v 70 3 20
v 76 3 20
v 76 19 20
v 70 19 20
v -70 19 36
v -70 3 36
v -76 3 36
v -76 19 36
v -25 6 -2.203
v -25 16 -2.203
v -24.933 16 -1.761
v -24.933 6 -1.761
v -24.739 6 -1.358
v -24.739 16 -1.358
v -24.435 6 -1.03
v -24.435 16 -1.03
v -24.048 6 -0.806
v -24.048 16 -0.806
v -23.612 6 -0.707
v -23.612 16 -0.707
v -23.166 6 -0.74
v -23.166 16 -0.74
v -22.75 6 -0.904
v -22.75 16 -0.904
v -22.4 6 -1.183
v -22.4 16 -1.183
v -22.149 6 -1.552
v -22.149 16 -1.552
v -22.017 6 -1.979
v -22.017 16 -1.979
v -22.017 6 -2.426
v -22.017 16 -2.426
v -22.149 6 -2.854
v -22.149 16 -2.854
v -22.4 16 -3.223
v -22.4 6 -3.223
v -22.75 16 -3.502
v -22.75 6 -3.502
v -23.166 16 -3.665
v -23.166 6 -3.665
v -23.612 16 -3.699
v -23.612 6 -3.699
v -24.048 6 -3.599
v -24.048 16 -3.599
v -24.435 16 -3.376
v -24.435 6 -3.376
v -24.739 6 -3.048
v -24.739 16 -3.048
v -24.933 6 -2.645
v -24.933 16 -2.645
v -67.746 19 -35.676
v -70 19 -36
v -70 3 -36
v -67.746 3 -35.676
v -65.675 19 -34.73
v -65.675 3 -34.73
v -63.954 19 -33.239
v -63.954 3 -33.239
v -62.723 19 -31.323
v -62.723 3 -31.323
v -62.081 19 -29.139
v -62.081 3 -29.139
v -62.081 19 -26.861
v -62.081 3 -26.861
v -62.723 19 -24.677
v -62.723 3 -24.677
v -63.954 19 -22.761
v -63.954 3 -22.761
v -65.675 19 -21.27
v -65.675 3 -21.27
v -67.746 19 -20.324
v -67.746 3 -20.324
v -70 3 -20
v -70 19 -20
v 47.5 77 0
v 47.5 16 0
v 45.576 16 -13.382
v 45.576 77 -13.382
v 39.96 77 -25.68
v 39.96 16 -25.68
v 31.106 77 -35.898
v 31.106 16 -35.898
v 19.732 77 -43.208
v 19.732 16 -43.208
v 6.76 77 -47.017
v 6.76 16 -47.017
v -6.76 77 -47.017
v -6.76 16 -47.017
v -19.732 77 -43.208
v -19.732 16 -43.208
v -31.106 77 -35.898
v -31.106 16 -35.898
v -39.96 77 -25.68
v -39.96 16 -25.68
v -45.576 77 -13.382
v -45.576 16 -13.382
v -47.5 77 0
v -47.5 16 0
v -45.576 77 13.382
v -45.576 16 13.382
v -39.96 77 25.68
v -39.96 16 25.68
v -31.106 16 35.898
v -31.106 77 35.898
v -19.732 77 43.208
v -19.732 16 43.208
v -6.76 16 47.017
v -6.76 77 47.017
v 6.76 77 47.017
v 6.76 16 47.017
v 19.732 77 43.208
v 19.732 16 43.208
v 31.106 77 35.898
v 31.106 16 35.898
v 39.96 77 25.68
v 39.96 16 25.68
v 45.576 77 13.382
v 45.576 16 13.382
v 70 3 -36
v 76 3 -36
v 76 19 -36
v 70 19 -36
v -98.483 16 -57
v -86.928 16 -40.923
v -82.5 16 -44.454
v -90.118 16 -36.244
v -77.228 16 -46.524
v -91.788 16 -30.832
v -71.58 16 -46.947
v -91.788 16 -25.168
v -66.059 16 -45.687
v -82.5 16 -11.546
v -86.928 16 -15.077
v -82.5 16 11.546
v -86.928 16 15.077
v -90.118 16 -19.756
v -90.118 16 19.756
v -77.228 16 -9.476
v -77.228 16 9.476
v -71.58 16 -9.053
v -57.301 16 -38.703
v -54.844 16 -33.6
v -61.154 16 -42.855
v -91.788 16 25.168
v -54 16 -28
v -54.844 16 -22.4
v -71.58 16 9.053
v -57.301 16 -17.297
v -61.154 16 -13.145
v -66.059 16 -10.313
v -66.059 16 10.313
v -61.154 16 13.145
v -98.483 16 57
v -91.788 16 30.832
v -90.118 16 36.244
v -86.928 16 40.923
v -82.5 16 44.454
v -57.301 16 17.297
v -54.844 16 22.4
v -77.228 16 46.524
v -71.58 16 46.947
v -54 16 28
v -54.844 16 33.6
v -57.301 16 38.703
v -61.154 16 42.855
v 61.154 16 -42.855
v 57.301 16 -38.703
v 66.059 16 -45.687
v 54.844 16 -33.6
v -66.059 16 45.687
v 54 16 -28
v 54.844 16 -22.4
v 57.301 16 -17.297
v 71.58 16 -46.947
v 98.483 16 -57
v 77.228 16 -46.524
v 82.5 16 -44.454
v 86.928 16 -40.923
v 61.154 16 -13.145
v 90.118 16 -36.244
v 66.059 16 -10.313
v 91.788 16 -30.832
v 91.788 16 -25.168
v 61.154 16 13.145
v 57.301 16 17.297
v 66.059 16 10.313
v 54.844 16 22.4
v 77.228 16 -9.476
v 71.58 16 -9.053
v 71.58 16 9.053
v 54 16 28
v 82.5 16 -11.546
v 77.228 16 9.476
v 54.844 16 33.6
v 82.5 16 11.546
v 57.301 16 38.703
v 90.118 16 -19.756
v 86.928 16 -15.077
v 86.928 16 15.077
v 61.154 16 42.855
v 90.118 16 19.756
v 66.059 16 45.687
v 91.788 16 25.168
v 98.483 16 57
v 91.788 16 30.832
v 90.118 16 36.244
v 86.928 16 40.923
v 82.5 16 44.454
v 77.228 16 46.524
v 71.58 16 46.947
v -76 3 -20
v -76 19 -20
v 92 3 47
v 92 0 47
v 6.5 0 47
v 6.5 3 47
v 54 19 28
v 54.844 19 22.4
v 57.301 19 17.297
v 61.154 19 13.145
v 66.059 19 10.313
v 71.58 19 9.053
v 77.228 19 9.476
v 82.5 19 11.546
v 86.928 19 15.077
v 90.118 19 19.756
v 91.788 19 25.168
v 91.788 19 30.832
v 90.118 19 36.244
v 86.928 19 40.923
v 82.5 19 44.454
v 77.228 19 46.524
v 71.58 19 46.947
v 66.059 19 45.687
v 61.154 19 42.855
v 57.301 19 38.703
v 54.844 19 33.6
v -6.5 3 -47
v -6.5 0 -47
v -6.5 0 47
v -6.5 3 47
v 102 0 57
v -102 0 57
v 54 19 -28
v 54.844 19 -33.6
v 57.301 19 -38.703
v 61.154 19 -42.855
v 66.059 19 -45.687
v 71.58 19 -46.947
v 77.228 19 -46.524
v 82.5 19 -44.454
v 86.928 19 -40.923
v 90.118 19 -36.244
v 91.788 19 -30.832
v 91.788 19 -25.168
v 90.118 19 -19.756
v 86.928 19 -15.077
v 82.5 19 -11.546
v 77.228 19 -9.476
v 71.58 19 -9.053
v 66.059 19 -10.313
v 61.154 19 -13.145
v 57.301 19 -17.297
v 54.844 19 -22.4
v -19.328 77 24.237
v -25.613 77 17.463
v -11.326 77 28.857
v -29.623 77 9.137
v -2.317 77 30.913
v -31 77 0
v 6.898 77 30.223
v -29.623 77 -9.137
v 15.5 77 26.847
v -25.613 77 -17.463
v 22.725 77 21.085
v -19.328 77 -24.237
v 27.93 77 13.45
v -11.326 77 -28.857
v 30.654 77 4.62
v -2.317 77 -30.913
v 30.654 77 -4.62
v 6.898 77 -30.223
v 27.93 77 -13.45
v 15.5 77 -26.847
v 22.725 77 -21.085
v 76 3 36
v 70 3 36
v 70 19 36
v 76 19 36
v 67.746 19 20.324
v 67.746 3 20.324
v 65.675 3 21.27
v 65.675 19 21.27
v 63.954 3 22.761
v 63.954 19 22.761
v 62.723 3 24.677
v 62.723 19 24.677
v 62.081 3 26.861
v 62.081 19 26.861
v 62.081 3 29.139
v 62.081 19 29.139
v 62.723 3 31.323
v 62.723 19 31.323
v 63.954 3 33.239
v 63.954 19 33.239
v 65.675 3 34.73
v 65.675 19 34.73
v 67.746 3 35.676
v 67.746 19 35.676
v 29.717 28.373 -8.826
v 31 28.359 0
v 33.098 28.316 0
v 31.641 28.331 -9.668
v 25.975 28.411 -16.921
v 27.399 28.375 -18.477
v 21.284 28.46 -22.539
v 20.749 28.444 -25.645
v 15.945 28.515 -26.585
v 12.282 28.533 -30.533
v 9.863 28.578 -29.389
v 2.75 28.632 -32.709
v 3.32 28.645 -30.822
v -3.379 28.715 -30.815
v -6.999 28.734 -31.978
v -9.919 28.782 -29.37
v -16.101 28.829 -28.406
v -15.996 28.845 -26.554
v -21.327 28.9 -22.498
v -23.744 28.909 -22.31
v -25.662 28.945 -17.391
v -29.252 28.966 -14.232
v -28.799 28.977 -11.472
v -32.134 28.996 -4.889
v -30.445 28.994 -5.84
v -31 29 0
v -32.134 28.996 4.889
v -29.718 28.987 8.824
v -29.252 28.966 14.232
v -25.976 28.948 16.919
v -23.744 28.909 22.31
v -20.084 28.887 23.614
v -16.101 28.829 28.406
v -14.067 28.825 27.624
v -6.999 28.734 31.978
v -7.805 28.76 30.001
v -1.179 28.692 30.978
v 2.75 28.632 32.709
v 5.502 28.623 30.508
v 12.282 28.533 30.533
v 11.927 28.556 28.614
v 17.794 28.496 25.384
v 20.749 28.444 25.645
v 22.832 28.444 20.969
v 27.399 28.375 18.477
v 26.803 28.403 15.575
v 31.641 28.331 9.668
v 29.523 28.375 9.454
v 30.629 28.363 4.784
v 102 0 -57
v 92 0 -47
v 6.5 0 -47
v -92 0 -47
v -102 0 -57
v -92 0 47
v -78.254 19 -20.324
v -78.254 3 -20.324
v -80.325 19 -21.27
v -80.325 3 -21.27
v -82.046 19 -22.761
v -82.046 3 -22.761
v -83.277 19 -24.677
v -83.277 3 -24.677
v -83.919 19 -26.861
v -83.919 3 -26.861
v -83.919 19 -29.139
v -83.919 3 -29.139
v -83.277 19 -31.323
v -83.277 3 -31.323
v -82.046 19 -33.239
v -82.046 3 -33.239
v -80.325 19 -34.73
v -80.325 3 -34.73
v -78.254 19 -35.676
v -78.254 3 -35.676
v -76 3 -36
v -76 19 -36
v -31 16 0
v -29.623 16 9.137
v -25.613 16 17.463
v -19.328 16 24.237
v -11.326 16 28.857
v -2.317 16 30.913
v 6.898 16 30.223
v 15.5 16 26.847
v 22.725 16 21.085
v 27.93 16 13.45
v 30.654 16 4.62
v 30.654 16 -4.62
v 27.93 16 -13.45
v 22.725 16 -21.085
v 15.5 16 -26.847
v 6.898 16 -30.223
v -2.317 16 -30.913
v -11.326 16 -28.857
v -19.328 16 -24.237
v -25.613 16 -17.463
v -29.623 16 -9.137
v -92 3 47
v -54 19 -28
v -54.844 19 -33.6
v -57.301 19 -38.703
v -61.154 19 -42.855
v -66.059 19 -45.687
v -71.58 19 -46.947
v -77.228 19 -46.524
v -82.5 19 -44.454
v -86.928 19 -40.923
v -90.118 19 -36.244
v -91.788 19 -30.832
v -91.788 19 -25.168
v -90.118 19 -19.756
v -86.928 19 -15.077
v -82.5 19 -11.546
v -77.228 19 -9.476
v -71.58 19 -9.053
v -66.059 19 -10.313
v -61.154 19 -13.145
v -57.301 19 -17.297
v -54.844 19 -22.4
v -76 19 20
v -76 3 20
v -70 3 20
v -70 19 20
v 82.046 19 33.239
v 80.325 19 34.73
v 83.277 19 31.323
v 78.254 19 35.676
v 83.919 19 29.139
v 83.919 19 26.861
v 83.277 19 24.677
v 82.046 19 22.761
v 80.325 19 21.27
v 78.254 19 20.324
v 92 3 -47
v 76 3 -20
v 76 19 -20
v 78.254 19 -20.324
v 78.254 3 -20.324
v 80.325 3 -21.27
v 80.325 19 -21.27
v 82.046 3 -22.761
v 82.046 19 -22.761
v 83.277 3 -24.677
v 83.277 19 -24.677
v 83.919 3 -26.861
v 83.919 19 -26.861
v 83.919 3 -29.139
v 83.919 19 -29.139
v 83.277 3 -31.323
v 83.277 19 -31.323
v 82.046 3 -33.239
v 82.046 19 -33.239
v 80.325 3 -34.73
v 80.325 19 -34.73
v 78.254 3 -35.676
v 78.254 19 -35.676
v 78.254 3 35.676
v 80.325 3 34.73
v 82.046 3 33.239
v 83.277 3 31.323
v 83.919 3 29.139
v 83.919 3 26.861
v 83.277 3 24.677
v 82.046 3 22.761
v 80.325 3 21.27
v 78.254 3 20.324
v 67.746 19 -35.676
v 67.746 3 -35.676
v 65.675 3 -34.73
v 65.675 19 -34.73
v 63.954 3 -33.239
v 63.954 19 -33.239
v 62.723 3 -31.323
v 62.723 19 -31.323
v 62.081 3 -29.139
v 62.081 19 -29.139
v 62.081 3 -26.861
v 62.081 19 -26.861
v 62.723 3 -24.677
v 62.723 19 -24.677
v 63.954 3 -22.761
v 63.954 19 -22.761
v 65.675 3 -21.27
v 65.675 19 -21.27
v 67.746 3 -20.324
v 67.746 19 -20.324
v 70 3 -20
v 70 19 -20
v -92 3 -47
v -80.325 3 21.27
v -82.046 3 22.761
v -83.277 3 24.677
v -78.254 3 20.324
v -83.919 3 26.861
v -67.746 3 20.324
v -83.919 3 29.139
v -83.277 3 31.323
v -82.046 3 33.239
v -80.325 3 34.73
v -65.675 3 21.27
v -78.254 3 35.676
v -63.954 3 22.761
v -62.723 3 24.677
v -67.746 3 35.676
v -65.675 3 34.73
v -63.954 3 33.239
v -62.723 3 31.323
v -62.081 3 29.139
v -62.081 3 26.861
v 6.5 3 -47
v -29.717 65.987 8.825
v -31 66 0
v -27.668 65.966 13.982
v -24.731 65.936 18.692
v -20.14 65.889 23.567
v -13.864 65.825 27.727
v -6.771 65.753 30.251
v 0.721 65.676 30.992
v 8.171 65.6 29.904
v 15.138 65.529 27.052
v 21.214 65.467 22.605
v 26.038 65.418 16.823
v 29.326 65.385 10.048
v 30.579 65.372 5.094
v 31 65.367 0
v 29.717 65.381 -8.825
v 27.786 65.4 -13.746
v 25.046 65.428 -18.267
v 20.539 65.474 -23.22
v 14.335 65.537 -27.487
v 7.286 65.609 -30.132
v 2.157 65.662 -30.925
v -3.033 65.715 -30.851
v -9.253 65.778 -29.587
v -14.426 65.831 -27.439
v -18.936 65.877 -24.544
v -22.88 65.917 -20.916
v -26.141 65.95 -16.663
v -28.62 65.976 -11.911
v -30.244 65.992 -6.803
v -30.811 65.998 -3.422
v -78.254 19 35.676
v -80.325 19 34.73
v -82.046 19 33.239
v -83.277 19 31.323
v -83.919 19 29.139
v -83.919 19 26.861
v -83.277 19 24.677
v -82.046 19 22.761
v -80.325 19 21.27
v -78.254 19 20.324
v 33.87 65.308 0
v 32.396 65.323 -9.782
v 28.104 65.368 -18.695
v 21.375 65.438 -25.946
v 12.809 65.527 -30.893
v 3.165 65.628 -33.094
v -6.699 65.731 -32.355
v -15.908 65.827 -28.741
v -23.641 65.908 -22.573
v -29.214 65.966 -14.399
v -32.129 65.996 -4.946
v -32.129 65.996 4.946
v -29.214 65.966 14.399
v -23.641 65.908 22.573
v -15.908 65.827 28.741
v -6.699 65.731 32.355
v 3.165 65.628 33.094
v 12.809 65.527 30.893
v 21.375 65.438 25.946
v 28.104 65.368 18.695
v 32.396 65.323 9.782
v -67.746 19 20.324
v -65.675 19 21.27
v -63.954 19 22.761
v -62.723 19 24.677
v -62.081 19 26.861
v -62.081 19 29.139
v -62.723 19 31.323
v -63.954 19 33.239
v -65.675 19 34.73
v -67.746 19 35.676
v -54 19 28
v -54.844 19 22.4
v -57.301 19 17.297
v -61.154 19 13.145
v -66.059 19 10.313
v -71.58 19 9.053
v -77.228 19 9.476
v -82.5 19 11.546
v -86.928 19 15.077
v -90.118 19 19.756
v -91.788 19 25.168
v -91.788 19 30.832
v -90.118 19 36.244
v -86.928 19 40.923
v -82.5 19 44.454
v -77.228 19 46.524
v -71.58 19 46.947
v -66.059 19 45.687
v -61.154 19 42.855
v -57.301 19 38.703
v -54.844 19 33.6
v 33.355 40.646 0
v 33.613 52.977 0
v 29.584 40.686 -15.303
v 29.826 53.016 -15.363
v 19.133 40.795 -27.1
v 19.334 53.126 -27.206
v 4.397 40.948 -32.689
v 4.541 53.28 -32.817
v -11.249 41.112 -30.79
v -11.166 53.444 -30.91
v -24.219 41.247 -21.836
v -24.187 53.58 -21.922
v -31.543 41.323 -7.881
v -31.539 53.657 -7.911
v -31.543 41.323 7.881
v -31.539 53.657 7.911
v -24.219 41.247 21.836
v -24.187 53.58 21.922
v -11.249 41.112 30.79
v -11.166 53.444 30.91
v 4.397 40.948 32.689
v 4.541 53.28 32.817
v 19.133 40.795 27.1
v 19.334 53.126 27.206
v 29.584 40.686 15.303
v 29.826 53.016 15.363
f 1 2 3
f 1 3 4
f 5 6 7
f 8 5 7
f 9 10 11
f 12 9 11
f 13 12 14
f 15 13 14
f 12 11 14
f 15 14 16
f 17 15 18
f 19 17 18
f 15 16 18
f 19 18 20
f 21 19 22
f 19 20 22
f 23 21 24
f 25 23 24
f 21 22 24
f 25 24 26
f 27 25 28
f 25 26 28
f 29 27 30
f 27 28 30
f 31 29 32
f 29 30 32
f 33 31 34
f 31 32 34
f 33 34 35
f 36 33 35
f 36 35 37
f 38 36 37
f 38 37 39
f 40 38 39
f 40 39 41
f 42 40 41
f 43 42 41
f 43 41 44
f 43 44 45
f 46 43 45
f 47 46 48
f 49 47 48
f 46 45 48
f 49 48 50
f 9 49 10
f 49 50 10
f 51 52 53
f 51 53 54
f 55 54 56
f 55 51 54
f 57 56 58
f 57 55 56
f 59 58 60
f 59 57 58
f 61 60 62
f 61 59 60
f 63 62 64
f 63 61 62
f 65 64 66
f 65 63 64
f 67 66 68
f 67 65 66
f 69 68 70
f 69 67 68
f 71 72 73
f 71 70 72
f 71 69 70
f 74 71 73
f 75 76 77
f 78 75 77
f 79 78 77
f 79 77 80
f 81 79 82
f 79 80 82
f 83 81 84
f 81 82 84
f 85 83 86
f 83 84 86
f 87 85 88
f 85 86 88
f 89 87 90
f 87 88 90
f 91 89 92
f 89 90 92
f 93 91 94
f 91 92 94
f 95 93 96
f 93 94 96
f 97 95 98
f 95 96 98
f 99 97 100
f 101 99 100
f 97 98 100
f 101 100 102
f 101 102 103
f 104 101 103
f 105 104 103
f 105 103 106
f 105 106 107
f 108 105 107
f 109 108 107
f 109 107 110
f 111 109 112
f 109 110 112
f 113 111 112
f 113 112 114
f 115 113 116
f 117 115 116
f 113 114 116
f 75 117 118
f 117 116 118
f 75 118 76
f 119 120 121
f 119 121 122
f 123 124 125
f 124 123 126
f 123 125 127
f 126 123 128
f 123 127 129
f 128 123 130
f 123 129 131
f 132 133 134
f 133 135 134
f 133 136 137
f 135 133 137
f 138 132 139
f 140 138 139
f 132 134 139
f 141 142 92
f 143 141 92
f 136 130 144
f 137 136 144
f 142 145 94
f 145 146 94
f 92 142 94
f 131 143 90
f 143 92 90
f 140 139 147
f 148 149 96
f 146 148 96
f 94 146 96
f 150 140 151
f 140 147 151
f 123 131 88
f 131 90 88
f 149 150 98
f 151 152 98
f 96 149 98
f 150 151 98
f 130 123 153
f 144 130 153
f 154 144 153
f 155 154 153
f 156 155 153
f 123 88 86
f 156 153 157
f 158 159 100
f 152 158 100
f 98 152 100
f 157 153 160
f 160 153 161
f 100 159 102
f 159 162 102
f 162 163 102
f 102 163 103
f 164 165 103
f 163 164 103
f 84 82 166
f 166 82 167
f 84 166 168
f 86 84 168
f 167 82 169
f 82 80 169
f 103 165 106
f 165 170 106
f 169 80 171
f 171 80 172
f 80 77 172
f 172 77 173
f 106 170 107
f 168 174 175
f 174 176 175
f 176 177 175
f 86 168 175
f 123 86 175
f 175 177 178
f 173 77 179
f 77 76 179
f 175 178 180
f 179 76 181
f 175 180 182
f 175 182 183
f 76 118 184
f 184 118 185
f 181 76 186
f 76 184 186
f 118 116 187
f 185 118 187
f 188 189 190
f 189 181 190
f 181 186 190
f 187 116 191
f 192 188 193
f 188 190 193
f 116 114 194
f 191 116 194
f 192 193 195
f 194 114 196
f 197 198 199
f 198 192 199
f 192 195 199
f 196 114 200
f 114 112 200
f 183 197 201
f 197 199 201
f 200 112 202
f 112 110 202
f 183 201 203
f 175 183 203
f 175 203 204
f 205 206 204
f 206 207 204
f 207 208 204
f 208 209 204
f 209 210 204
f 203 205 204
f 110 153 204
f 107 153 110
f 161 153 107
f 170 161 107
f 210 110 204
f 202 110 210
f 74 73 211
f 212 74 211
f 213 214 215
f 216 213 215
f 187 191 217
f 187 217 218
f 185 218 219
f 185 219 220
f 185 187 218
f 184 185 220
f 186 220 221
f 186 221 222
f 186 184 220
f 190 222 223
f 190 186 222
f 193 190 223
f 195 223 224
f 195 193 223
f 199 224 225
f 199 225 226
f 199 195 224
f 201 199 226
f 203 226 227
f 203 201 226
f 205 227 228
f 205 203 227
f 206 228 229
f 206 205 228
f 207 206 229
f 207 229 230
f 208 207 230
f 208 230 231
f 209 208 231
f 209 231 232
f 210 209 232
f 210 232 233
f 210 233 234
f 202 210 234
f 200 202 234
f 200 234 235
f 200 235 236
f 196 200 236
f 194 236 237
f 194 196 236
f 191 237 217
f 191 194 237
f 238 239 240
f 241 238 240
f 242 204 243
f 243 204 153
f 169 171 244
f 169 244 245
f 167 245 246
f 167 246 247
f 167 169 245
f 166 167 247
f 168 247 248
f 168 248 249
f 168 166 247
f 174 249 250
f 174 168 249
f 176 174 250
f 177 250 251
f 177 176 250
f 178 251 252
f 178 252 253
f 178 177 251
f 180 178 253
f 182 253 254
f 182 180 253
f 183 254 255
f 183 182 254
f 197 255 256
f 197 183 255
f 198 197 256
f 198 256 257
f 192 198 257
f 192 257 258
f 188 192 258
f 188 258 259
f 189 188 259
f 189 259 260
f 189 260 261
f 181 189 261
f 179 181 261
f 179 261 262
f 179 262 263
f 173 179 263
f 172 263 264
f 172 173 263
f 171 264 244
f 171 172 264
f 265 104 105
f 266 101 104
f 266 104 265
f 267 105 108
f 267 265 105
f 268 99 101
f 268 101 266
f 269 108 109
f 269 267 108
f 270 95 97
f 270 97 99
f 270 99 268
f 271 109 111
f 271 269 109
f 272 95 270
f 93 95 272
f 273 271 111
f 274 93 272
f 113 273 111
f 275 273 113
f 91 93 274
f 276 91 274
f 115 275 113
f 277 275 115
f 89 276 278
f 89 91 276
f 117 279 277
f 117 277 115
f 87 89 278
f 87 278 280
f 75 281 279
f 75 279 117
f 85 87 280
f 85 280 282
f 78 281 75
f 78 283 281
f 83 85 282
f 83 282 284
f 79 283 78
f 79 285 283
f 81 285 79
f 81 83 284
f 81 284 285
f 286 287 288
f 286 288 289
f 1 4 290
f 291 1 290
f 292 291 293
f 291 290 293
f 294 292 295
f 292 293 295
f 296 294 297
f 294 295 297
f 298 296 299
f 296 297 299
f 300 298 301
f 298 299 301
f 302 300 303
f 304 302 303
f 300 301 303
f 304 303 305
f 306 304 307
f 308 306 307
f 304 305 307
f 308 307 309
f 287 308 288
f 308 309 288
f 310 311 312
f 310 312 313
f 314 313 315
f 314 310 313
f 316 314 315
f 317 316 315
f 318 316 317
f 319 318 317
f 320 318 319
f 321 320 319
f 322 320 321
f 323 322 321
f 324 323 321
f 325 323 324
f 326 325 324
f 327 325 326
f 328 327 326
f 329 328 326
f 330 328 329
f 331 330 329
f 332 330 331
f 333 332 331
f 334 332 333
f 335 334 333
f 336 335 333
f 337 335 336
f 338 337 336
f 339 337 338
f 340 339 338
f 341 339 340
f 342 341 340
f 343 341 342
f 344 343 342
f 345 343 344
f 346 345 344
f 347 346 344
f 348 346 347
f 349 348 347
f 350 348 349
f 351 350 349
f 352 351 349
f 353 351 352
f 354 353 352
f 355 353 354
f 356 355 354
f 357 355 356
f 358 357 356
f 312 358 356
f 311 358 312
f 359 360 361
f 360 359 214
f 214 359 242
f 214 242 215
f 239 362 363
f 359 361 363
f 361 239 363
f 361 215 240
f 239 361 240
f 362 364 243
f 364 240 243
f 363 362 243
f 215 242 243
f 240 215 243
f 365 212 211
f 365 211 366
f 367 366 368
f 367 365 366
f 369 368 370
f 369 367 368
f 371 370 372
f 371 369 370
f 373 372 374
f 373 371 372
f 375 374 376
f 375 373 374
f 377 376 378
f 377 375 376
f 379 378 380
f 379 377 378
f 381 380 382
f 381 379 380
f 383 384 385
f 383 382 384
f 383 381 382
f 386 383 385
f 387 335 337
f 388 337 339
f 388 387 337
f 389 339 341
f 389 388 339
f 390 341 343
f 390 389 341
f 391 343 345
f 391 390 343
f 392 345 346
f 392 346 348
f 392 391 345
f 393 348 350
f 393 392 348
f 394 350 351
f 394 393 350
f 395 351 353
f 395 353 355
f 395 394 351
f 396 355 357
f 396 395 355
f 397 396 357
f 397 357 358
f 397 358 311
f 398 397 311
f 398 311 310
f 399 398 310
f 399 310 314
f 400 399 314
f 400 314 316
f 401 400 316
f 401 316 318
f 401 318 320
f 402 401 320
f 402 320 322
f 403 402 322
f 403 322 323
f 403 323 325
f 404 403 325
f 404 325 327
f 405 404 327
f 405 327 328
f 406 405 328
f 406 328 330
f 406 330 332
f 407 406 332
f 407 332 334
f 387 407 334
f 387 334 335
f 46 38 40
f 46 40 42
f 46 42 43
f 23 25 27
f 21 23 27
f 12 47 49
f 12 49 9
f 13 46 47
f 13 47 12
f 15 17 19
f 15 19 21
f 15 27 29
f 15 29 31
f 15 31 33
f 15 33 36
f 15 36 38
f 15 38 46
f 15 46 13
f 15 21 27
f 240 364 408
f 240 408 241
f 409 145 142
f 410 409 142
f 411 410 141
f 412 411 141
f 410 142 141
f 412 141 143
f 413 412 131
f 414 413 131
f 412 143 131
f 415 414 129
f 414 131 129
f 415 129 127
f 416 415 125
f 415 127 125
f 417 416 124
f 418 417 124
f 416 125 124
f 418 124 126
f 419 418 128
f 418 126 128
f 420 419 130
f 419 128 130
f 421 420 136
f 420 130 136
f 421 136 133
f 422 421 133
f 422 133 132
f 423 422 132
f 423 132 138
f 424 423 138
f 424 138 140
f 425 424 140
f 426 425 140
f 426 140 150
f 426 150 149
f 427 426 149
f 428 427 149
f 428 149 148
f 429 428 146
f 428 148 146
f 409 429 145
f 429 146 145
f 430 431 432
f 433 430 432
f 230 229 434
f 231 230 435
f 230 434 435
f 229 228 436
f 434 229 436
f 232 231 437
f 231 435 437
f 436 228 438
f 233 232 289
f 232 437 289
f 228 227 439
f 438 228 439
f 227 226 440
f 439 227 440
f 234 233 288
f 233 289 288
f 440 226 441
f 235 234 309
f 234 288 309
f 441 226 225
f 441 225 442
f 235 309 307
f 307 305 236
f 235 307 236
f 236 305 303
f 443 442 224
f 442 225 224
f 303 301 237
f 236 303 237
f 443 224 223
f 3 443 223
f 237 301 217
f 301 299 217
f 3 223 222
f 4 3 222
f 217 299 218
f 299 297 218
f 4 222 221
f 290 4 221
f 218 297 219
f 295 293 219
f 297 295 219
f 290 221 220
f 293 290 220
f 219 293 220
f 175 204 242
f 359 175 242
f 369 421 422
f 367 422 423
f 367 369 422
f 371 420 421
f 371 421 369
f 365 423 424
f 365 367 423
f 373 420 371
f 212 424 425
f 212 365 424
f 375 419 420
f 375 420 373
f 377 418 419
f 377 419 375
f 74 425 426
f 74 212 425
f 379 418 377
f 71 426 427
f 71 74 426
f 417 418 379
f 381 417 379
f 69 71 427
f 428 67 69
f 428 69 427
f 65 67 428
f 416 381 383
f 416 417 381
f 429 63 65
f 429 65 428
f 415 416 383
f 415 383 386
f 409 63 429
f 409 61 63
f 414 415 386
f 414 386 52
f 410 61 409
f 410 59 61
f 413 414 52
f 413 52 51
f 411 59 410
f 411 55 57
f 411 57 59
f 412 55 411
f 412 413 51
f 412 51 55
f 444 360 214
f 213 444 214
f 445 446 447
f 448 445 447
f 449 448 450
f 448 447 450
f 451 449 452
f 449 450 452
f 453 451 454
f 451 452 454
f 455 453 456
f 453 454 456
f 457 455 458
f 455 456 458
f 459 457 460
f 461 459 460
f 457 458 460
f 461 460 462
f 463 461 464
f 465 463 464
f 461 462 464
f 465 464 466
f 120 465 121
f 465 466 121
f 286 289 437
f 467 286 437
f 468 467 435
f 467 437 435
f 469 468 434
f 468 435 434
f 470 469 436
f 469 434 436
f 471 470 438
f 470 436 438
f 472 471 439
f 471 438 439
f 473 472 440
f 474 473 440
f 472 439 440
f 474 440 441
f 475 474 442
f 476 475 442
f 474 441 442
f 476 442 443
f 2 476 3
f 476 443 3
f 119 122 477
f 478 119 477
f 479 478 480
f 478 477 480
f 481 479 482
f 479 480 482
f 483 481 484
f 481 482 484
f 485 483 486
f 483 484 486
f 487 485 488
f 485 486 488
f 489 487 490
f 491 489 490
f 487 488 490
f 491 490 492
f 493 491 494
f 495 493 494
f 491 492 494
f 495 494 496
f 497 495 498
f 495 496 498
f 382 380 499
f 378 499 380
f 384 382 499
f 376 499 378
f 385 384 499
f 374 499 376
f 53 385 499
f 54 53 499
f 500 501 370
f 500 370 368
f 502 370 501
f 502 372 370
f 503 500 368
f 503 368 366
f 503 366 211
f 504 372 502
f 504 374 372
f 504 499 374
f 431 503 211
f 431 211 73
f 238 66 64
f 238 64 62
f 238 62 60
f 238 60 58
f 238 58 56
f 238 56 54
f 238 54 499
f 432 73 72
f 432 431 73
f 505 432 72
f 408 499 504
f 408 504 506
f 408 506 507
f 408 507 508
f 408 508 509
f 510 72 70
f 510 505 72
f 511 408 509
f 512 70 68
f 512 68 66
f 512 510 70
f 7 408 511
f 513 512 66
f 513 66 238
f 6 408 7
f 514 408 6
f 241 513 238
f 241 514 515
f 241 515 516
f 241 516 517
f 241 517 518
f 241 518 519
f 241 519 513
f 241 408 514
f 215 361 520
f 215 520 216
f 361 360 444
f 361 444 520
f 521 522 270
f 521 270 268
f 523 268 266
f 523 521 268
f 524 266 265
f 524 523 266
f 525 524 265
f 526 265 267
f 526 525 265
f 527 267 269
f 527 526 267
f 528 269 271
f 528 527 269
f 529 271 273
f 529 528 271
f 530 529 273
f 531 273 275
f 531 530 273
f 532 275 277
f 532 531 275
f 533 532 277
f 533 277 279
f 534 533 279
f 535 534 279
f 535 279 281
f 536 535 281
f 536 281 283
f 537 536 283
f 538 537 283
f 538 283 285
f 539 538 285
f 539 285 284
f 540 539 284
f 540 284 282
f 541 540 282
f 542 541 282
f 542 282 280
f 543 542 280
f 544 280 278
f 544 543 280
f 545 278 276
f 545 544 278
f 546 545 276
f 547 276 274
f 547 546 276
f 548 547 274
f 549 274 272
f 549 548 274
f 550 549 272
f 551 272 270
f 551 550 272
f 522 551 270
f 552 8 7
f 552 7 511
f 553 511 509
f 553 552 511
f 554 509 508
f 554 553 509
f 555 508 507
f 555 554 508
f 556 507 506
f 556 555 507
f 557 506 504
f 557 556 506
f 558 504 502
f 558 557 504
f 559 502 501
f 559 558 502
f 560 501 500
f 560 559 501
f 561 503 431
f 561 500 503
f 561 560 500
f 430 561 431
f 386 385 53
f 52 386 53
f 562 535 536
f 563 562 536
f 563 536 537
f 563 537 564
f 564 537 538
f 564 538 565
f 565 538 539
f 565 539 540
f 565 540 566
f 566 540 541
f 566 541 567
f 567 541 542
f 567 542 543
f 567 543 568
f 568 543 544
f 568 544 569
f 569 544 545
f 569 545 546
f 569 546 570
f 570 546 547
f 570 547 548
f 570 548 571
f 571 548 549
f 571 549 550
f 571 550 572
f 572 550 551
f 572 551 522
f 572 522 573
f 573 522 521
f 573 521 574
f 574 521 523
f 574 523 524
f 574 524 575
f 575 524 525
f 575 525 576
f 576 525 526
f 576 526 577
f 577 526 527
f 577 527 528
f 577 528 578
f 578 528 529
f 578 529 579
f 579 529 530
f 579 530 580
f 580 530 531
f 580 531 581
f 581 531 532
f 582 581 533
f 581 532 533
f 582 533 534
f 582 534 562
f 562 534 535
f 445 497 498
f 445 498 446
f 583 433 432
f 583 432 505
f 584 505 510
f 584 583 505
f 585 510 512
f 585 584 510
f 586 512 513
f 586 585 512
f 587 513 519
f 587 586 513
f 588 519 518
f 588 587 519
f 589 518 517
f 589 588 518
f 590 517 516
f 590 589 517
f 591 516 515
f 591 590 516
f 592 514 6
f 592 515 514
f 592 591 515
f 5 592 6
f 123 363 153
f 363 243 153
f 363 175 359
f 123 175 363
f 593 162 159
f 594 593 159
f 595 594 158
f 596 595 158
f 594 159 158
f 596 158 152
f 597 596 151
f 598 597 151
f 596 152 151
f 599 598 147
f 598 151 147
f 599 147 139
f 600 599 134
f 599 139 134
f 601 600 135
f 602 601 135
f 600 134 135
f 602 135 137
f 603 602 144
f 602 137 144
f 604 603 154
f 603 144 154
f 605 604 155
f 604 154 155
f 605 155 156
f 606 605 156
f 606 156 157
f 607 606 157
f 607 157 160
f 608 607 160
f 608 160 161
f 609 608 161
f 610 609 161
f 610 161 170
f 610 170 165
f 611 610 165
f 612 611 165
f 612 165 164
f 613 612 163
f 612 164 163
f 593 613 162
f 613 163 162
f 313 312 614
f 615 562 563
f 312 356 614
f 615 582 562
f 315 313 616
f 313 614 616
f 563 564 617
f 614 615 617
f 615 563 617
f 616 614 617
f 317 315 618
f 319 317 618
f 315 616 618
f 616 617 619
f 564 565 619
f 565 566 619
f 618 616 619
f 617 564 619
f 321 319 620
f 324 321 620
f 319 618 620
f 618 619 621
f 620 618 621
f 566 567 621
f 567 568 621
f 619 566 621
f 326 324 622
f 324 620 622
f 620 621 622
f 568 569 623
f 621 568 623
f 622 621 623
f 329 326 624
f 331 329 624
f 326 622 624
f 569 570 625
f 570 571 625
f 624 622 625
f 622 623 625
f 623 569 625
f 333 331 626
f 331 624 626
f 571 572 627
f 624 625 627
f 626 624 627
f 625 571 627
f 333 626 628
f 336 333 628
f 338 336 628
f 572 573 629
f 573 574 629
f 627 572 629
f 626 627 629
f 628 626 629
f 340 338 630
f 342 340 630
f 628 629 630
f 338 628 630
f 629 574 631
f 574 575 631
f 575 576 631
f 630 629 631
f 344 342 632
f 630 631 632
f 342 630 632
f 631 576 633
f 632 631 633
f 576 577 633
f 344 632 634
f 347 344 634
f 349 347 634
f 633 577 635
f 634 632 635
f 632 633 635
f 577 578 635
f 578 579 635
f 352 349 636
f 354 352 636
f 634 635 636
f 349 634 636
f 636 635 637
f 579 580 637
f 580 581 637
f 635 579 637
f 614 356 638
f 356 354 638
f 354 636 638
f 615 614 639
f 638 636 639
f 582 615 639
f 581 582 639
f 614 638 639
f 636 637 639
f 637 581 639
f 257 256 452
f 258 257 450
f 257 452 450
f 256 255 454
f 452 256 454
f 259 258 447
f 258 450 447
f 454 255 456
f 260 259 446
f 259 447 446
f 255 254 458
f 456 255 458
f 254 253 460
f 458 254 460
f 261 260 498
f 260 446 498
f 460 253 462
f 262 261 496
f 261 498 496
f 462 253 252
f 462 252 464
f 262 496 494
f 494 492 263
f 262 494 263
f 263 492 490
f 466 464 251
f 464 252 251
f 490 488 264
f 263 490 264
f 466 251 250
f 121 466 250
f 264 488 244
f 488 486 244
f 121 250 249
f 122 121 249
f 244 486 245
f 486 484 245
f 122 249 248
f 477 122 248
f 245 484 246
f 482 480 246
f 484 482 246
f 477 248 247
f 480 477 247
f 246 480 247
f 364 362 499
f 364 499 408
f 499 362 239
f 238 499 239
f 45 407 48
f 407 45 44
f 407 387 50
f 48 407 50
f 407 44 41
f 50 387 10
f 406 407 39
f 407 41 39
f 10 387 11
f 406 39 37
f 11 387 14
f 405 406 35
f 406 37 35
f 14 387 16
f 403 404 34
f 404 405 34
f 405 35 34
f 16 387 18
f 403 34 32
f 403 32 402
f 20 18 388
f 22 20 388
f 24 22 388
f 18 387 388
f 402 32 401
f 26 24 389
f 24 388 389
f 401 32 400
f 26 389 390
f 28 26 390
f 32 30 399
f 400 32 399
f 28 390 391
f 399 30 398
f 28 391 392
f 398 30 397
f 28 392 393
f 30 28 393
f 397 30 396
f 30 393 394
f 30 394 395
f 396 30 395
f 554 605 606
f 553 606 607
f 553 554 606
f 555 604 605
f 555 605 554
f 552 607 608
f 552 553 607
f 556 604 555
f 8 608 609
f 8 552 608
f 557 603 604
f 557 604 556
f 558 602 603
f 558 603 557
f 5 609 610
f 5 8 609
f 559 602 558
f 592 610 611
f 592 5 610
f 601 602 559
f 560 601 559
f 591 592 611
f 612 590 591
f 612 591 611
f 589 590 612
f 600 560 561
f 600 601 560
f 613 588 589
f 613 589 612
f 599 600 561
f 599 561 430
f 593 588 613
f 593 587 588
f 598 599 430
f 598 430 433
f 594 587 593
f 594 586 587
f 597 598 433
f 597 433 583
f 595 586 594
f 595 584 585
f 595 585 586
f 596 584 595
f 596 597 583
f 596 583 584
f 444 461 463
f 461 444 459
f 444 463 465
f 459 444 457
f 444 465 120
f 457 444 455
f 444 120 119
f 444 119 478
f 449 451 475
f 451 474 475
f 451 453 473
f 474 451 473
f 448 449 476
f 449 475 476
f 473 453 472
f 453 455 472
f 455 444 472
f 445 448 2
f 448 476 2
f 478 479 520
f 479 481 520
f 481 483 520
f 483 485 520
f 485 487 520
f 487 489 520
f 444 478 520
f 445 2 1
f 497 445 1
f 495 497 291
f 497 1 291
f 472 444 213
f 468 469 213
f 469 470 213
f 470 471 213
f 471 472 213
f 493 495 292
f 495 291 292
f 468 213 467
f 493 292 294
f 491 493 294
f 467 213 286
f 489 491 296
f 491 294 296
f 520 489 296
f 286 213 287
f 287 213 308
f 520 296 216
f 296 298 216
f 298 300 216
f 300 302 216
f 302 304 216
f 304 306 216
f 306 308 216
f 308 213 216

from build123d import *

# Parameters (mm, degrees)
BOSS_EXTRUDE1_DEPTH = 57
SKETCH2_W           = 85.5
SKETCH2_H           = 94
CUT_EXTRUDE1_DEPTH  = 3
SKETCH5_R           = 19
BOSS_EXTRUDE4_DEPTH = 3
CUT_EXTRUDE3_DEPTH  = 20
SKETCH7_R           = 47.5
SKETCH7_R_2         = 31
BOSS_EXTRUDE5_DEPTH = 61
SKETCH12_W          = 3
SKETCH12_H          = 37
SKETCH17_R          = 1.5
CUT_EXTRUDE4_DEPTH  = 10


with BuildPart() as part:
    # Sketch1 → Boss-Extrude1 (new body, symmetric)
    with BuildSketch(Plane.XY):
        Polygon((102, 0), (-102, 0), (-98.482758621, 16), (98.482758621, 16), align=None)
    extrude(amount=BOSS_EXTRUDE1_DEPTH, both=True)

    # Sketch2 → Cut-Extrude1 (cut)
    with BuildSketch(Plane.XZ):
        with Locations((-49.25, 0)):
            Rectangle(SKETCH2_W, SKETCH2_H)
    cut_extrude1 = extrude(amount=-CUT_EXTRUDE1_DEPTH, mode=Mode.SUBTRACT)

    # Mirror1: Cut-Extrude1 across plane
    add(cut_extrude1.mirror(Plane(origin=(0, 0, 0), x_dir=(0, 0, 1), z_dir=(1, 0, 0))), mode=Mode.SUBTRACT)

    # Sketch5 → Boss-Extrude4 (add)
    with BuildSketch(Plane(origin=(0, 16, 0), x_dir=(1, 0, 0), z_dir=(0, 1, 0))):
        with Locations((-73, 28)):
            Circle(SKETCH5_R)
        with Locations((-73, -28)):
            Circle(SKETCH5_R)
    boss_extrude4 = extrude(amount=BOSS_EXTRUDE4_DEPTH)

    # Sketch6 → Cut-Extrude3 (cut, through all)
    with BuildSketch(Plane(origin=(0, 19, 0), x_dir=(1, 0, 0), z_dir=(0, 1, 0))):
        with BuildLine():
            Line((-76, 36), (-70, 36))
            ThreePointArc((-70, 36), (-62, 28), (-70, 20))
            Line((-70, 20), (-76, 20))
            ThreePointArc((-76, 20), (-84, 28), (-76, 36))
        make_face()
        with BuildLine():
            Line((-76, -20), (-70, -20))
            ThreePointArc((-70, -20), (-62, -28), (-70, -36))
            Line((-70, -36), (-76, -36))
            ThreePointArc((-76, -36), (-84, -28), (-76, -20))
        make_face()
    cut_extrude3 = extrude(amount=-CUT_EXTRUDE3_DEPTH, mode=Mode.SUBTRACT)

    # Mirror2: Boss-Extrude4, Cut-Extrude3 across plane
    add(boss_extrude4.mirror(Plane(origin=(0, 0, 0), x_dir=(0, 0, 1), z_dir=(1, 0, 0))))
    add(cut_extrude3.mirror(Plane(origin=(0, 0, 0), x_dir=(0, 0, 1), z_dir=(1, 0, 0))), mode=Mode.SUBTRACT)

    # Sketch7 → Boss-Extrude5 (add)
    with BuildSketch(Plane(origin=(0, 16, 0), x_dir=(1, 0, 0), z_dir=(0, 1, 0))):
        Circle(SKETCH7_R)
        with Locations(Location((0, 0, 0), (0, 0, 180))):  # turned: the seam where the file's is
            Circle(SKETCH7_R_2, mode=Mode.SUBTRACT)
    extrude(amount=BOSS_EXTRUDE5_DEPTH)

    # Sketch12 → Cut-Revolve6 (revolve, cut)
    with BuildSketch(Plane.XY, mode=Mode.PRIVATE) as cut_revolve6_sk:
        with Locations((-31, 47.5)):
            Rectangle(SKETCH12_W, SKETCH12_H)
    revolve(cut_revolve6_sk.sketch.rotate(Axis((0, 0, 0), (0.010431918, 0.999945586, 0)), 180), axis=Axis((0, 0, 0), (0.010431918, 0.999945586, 0)), mode=Mode.SUBTRACT)  # turned: the seam where the file's is

    # Sketch17 → Cut-Extrude4 (cut)
    with BuildSketch(Plane(origin=(0, 16, 0), x_dir=(1, 0, 0), z_dir=(0, 1, 0))):
        with Locations(Location((-23.5, 2.202781608, 0), (0, 0, 180))):  # turned: the seam where the file's is
            Circle(SKETCH17_R)
    extrude(amount=-CUT_EXTRUDE4_DEPTH, mode=Mode.SUBTRACT)


solid = part.part
